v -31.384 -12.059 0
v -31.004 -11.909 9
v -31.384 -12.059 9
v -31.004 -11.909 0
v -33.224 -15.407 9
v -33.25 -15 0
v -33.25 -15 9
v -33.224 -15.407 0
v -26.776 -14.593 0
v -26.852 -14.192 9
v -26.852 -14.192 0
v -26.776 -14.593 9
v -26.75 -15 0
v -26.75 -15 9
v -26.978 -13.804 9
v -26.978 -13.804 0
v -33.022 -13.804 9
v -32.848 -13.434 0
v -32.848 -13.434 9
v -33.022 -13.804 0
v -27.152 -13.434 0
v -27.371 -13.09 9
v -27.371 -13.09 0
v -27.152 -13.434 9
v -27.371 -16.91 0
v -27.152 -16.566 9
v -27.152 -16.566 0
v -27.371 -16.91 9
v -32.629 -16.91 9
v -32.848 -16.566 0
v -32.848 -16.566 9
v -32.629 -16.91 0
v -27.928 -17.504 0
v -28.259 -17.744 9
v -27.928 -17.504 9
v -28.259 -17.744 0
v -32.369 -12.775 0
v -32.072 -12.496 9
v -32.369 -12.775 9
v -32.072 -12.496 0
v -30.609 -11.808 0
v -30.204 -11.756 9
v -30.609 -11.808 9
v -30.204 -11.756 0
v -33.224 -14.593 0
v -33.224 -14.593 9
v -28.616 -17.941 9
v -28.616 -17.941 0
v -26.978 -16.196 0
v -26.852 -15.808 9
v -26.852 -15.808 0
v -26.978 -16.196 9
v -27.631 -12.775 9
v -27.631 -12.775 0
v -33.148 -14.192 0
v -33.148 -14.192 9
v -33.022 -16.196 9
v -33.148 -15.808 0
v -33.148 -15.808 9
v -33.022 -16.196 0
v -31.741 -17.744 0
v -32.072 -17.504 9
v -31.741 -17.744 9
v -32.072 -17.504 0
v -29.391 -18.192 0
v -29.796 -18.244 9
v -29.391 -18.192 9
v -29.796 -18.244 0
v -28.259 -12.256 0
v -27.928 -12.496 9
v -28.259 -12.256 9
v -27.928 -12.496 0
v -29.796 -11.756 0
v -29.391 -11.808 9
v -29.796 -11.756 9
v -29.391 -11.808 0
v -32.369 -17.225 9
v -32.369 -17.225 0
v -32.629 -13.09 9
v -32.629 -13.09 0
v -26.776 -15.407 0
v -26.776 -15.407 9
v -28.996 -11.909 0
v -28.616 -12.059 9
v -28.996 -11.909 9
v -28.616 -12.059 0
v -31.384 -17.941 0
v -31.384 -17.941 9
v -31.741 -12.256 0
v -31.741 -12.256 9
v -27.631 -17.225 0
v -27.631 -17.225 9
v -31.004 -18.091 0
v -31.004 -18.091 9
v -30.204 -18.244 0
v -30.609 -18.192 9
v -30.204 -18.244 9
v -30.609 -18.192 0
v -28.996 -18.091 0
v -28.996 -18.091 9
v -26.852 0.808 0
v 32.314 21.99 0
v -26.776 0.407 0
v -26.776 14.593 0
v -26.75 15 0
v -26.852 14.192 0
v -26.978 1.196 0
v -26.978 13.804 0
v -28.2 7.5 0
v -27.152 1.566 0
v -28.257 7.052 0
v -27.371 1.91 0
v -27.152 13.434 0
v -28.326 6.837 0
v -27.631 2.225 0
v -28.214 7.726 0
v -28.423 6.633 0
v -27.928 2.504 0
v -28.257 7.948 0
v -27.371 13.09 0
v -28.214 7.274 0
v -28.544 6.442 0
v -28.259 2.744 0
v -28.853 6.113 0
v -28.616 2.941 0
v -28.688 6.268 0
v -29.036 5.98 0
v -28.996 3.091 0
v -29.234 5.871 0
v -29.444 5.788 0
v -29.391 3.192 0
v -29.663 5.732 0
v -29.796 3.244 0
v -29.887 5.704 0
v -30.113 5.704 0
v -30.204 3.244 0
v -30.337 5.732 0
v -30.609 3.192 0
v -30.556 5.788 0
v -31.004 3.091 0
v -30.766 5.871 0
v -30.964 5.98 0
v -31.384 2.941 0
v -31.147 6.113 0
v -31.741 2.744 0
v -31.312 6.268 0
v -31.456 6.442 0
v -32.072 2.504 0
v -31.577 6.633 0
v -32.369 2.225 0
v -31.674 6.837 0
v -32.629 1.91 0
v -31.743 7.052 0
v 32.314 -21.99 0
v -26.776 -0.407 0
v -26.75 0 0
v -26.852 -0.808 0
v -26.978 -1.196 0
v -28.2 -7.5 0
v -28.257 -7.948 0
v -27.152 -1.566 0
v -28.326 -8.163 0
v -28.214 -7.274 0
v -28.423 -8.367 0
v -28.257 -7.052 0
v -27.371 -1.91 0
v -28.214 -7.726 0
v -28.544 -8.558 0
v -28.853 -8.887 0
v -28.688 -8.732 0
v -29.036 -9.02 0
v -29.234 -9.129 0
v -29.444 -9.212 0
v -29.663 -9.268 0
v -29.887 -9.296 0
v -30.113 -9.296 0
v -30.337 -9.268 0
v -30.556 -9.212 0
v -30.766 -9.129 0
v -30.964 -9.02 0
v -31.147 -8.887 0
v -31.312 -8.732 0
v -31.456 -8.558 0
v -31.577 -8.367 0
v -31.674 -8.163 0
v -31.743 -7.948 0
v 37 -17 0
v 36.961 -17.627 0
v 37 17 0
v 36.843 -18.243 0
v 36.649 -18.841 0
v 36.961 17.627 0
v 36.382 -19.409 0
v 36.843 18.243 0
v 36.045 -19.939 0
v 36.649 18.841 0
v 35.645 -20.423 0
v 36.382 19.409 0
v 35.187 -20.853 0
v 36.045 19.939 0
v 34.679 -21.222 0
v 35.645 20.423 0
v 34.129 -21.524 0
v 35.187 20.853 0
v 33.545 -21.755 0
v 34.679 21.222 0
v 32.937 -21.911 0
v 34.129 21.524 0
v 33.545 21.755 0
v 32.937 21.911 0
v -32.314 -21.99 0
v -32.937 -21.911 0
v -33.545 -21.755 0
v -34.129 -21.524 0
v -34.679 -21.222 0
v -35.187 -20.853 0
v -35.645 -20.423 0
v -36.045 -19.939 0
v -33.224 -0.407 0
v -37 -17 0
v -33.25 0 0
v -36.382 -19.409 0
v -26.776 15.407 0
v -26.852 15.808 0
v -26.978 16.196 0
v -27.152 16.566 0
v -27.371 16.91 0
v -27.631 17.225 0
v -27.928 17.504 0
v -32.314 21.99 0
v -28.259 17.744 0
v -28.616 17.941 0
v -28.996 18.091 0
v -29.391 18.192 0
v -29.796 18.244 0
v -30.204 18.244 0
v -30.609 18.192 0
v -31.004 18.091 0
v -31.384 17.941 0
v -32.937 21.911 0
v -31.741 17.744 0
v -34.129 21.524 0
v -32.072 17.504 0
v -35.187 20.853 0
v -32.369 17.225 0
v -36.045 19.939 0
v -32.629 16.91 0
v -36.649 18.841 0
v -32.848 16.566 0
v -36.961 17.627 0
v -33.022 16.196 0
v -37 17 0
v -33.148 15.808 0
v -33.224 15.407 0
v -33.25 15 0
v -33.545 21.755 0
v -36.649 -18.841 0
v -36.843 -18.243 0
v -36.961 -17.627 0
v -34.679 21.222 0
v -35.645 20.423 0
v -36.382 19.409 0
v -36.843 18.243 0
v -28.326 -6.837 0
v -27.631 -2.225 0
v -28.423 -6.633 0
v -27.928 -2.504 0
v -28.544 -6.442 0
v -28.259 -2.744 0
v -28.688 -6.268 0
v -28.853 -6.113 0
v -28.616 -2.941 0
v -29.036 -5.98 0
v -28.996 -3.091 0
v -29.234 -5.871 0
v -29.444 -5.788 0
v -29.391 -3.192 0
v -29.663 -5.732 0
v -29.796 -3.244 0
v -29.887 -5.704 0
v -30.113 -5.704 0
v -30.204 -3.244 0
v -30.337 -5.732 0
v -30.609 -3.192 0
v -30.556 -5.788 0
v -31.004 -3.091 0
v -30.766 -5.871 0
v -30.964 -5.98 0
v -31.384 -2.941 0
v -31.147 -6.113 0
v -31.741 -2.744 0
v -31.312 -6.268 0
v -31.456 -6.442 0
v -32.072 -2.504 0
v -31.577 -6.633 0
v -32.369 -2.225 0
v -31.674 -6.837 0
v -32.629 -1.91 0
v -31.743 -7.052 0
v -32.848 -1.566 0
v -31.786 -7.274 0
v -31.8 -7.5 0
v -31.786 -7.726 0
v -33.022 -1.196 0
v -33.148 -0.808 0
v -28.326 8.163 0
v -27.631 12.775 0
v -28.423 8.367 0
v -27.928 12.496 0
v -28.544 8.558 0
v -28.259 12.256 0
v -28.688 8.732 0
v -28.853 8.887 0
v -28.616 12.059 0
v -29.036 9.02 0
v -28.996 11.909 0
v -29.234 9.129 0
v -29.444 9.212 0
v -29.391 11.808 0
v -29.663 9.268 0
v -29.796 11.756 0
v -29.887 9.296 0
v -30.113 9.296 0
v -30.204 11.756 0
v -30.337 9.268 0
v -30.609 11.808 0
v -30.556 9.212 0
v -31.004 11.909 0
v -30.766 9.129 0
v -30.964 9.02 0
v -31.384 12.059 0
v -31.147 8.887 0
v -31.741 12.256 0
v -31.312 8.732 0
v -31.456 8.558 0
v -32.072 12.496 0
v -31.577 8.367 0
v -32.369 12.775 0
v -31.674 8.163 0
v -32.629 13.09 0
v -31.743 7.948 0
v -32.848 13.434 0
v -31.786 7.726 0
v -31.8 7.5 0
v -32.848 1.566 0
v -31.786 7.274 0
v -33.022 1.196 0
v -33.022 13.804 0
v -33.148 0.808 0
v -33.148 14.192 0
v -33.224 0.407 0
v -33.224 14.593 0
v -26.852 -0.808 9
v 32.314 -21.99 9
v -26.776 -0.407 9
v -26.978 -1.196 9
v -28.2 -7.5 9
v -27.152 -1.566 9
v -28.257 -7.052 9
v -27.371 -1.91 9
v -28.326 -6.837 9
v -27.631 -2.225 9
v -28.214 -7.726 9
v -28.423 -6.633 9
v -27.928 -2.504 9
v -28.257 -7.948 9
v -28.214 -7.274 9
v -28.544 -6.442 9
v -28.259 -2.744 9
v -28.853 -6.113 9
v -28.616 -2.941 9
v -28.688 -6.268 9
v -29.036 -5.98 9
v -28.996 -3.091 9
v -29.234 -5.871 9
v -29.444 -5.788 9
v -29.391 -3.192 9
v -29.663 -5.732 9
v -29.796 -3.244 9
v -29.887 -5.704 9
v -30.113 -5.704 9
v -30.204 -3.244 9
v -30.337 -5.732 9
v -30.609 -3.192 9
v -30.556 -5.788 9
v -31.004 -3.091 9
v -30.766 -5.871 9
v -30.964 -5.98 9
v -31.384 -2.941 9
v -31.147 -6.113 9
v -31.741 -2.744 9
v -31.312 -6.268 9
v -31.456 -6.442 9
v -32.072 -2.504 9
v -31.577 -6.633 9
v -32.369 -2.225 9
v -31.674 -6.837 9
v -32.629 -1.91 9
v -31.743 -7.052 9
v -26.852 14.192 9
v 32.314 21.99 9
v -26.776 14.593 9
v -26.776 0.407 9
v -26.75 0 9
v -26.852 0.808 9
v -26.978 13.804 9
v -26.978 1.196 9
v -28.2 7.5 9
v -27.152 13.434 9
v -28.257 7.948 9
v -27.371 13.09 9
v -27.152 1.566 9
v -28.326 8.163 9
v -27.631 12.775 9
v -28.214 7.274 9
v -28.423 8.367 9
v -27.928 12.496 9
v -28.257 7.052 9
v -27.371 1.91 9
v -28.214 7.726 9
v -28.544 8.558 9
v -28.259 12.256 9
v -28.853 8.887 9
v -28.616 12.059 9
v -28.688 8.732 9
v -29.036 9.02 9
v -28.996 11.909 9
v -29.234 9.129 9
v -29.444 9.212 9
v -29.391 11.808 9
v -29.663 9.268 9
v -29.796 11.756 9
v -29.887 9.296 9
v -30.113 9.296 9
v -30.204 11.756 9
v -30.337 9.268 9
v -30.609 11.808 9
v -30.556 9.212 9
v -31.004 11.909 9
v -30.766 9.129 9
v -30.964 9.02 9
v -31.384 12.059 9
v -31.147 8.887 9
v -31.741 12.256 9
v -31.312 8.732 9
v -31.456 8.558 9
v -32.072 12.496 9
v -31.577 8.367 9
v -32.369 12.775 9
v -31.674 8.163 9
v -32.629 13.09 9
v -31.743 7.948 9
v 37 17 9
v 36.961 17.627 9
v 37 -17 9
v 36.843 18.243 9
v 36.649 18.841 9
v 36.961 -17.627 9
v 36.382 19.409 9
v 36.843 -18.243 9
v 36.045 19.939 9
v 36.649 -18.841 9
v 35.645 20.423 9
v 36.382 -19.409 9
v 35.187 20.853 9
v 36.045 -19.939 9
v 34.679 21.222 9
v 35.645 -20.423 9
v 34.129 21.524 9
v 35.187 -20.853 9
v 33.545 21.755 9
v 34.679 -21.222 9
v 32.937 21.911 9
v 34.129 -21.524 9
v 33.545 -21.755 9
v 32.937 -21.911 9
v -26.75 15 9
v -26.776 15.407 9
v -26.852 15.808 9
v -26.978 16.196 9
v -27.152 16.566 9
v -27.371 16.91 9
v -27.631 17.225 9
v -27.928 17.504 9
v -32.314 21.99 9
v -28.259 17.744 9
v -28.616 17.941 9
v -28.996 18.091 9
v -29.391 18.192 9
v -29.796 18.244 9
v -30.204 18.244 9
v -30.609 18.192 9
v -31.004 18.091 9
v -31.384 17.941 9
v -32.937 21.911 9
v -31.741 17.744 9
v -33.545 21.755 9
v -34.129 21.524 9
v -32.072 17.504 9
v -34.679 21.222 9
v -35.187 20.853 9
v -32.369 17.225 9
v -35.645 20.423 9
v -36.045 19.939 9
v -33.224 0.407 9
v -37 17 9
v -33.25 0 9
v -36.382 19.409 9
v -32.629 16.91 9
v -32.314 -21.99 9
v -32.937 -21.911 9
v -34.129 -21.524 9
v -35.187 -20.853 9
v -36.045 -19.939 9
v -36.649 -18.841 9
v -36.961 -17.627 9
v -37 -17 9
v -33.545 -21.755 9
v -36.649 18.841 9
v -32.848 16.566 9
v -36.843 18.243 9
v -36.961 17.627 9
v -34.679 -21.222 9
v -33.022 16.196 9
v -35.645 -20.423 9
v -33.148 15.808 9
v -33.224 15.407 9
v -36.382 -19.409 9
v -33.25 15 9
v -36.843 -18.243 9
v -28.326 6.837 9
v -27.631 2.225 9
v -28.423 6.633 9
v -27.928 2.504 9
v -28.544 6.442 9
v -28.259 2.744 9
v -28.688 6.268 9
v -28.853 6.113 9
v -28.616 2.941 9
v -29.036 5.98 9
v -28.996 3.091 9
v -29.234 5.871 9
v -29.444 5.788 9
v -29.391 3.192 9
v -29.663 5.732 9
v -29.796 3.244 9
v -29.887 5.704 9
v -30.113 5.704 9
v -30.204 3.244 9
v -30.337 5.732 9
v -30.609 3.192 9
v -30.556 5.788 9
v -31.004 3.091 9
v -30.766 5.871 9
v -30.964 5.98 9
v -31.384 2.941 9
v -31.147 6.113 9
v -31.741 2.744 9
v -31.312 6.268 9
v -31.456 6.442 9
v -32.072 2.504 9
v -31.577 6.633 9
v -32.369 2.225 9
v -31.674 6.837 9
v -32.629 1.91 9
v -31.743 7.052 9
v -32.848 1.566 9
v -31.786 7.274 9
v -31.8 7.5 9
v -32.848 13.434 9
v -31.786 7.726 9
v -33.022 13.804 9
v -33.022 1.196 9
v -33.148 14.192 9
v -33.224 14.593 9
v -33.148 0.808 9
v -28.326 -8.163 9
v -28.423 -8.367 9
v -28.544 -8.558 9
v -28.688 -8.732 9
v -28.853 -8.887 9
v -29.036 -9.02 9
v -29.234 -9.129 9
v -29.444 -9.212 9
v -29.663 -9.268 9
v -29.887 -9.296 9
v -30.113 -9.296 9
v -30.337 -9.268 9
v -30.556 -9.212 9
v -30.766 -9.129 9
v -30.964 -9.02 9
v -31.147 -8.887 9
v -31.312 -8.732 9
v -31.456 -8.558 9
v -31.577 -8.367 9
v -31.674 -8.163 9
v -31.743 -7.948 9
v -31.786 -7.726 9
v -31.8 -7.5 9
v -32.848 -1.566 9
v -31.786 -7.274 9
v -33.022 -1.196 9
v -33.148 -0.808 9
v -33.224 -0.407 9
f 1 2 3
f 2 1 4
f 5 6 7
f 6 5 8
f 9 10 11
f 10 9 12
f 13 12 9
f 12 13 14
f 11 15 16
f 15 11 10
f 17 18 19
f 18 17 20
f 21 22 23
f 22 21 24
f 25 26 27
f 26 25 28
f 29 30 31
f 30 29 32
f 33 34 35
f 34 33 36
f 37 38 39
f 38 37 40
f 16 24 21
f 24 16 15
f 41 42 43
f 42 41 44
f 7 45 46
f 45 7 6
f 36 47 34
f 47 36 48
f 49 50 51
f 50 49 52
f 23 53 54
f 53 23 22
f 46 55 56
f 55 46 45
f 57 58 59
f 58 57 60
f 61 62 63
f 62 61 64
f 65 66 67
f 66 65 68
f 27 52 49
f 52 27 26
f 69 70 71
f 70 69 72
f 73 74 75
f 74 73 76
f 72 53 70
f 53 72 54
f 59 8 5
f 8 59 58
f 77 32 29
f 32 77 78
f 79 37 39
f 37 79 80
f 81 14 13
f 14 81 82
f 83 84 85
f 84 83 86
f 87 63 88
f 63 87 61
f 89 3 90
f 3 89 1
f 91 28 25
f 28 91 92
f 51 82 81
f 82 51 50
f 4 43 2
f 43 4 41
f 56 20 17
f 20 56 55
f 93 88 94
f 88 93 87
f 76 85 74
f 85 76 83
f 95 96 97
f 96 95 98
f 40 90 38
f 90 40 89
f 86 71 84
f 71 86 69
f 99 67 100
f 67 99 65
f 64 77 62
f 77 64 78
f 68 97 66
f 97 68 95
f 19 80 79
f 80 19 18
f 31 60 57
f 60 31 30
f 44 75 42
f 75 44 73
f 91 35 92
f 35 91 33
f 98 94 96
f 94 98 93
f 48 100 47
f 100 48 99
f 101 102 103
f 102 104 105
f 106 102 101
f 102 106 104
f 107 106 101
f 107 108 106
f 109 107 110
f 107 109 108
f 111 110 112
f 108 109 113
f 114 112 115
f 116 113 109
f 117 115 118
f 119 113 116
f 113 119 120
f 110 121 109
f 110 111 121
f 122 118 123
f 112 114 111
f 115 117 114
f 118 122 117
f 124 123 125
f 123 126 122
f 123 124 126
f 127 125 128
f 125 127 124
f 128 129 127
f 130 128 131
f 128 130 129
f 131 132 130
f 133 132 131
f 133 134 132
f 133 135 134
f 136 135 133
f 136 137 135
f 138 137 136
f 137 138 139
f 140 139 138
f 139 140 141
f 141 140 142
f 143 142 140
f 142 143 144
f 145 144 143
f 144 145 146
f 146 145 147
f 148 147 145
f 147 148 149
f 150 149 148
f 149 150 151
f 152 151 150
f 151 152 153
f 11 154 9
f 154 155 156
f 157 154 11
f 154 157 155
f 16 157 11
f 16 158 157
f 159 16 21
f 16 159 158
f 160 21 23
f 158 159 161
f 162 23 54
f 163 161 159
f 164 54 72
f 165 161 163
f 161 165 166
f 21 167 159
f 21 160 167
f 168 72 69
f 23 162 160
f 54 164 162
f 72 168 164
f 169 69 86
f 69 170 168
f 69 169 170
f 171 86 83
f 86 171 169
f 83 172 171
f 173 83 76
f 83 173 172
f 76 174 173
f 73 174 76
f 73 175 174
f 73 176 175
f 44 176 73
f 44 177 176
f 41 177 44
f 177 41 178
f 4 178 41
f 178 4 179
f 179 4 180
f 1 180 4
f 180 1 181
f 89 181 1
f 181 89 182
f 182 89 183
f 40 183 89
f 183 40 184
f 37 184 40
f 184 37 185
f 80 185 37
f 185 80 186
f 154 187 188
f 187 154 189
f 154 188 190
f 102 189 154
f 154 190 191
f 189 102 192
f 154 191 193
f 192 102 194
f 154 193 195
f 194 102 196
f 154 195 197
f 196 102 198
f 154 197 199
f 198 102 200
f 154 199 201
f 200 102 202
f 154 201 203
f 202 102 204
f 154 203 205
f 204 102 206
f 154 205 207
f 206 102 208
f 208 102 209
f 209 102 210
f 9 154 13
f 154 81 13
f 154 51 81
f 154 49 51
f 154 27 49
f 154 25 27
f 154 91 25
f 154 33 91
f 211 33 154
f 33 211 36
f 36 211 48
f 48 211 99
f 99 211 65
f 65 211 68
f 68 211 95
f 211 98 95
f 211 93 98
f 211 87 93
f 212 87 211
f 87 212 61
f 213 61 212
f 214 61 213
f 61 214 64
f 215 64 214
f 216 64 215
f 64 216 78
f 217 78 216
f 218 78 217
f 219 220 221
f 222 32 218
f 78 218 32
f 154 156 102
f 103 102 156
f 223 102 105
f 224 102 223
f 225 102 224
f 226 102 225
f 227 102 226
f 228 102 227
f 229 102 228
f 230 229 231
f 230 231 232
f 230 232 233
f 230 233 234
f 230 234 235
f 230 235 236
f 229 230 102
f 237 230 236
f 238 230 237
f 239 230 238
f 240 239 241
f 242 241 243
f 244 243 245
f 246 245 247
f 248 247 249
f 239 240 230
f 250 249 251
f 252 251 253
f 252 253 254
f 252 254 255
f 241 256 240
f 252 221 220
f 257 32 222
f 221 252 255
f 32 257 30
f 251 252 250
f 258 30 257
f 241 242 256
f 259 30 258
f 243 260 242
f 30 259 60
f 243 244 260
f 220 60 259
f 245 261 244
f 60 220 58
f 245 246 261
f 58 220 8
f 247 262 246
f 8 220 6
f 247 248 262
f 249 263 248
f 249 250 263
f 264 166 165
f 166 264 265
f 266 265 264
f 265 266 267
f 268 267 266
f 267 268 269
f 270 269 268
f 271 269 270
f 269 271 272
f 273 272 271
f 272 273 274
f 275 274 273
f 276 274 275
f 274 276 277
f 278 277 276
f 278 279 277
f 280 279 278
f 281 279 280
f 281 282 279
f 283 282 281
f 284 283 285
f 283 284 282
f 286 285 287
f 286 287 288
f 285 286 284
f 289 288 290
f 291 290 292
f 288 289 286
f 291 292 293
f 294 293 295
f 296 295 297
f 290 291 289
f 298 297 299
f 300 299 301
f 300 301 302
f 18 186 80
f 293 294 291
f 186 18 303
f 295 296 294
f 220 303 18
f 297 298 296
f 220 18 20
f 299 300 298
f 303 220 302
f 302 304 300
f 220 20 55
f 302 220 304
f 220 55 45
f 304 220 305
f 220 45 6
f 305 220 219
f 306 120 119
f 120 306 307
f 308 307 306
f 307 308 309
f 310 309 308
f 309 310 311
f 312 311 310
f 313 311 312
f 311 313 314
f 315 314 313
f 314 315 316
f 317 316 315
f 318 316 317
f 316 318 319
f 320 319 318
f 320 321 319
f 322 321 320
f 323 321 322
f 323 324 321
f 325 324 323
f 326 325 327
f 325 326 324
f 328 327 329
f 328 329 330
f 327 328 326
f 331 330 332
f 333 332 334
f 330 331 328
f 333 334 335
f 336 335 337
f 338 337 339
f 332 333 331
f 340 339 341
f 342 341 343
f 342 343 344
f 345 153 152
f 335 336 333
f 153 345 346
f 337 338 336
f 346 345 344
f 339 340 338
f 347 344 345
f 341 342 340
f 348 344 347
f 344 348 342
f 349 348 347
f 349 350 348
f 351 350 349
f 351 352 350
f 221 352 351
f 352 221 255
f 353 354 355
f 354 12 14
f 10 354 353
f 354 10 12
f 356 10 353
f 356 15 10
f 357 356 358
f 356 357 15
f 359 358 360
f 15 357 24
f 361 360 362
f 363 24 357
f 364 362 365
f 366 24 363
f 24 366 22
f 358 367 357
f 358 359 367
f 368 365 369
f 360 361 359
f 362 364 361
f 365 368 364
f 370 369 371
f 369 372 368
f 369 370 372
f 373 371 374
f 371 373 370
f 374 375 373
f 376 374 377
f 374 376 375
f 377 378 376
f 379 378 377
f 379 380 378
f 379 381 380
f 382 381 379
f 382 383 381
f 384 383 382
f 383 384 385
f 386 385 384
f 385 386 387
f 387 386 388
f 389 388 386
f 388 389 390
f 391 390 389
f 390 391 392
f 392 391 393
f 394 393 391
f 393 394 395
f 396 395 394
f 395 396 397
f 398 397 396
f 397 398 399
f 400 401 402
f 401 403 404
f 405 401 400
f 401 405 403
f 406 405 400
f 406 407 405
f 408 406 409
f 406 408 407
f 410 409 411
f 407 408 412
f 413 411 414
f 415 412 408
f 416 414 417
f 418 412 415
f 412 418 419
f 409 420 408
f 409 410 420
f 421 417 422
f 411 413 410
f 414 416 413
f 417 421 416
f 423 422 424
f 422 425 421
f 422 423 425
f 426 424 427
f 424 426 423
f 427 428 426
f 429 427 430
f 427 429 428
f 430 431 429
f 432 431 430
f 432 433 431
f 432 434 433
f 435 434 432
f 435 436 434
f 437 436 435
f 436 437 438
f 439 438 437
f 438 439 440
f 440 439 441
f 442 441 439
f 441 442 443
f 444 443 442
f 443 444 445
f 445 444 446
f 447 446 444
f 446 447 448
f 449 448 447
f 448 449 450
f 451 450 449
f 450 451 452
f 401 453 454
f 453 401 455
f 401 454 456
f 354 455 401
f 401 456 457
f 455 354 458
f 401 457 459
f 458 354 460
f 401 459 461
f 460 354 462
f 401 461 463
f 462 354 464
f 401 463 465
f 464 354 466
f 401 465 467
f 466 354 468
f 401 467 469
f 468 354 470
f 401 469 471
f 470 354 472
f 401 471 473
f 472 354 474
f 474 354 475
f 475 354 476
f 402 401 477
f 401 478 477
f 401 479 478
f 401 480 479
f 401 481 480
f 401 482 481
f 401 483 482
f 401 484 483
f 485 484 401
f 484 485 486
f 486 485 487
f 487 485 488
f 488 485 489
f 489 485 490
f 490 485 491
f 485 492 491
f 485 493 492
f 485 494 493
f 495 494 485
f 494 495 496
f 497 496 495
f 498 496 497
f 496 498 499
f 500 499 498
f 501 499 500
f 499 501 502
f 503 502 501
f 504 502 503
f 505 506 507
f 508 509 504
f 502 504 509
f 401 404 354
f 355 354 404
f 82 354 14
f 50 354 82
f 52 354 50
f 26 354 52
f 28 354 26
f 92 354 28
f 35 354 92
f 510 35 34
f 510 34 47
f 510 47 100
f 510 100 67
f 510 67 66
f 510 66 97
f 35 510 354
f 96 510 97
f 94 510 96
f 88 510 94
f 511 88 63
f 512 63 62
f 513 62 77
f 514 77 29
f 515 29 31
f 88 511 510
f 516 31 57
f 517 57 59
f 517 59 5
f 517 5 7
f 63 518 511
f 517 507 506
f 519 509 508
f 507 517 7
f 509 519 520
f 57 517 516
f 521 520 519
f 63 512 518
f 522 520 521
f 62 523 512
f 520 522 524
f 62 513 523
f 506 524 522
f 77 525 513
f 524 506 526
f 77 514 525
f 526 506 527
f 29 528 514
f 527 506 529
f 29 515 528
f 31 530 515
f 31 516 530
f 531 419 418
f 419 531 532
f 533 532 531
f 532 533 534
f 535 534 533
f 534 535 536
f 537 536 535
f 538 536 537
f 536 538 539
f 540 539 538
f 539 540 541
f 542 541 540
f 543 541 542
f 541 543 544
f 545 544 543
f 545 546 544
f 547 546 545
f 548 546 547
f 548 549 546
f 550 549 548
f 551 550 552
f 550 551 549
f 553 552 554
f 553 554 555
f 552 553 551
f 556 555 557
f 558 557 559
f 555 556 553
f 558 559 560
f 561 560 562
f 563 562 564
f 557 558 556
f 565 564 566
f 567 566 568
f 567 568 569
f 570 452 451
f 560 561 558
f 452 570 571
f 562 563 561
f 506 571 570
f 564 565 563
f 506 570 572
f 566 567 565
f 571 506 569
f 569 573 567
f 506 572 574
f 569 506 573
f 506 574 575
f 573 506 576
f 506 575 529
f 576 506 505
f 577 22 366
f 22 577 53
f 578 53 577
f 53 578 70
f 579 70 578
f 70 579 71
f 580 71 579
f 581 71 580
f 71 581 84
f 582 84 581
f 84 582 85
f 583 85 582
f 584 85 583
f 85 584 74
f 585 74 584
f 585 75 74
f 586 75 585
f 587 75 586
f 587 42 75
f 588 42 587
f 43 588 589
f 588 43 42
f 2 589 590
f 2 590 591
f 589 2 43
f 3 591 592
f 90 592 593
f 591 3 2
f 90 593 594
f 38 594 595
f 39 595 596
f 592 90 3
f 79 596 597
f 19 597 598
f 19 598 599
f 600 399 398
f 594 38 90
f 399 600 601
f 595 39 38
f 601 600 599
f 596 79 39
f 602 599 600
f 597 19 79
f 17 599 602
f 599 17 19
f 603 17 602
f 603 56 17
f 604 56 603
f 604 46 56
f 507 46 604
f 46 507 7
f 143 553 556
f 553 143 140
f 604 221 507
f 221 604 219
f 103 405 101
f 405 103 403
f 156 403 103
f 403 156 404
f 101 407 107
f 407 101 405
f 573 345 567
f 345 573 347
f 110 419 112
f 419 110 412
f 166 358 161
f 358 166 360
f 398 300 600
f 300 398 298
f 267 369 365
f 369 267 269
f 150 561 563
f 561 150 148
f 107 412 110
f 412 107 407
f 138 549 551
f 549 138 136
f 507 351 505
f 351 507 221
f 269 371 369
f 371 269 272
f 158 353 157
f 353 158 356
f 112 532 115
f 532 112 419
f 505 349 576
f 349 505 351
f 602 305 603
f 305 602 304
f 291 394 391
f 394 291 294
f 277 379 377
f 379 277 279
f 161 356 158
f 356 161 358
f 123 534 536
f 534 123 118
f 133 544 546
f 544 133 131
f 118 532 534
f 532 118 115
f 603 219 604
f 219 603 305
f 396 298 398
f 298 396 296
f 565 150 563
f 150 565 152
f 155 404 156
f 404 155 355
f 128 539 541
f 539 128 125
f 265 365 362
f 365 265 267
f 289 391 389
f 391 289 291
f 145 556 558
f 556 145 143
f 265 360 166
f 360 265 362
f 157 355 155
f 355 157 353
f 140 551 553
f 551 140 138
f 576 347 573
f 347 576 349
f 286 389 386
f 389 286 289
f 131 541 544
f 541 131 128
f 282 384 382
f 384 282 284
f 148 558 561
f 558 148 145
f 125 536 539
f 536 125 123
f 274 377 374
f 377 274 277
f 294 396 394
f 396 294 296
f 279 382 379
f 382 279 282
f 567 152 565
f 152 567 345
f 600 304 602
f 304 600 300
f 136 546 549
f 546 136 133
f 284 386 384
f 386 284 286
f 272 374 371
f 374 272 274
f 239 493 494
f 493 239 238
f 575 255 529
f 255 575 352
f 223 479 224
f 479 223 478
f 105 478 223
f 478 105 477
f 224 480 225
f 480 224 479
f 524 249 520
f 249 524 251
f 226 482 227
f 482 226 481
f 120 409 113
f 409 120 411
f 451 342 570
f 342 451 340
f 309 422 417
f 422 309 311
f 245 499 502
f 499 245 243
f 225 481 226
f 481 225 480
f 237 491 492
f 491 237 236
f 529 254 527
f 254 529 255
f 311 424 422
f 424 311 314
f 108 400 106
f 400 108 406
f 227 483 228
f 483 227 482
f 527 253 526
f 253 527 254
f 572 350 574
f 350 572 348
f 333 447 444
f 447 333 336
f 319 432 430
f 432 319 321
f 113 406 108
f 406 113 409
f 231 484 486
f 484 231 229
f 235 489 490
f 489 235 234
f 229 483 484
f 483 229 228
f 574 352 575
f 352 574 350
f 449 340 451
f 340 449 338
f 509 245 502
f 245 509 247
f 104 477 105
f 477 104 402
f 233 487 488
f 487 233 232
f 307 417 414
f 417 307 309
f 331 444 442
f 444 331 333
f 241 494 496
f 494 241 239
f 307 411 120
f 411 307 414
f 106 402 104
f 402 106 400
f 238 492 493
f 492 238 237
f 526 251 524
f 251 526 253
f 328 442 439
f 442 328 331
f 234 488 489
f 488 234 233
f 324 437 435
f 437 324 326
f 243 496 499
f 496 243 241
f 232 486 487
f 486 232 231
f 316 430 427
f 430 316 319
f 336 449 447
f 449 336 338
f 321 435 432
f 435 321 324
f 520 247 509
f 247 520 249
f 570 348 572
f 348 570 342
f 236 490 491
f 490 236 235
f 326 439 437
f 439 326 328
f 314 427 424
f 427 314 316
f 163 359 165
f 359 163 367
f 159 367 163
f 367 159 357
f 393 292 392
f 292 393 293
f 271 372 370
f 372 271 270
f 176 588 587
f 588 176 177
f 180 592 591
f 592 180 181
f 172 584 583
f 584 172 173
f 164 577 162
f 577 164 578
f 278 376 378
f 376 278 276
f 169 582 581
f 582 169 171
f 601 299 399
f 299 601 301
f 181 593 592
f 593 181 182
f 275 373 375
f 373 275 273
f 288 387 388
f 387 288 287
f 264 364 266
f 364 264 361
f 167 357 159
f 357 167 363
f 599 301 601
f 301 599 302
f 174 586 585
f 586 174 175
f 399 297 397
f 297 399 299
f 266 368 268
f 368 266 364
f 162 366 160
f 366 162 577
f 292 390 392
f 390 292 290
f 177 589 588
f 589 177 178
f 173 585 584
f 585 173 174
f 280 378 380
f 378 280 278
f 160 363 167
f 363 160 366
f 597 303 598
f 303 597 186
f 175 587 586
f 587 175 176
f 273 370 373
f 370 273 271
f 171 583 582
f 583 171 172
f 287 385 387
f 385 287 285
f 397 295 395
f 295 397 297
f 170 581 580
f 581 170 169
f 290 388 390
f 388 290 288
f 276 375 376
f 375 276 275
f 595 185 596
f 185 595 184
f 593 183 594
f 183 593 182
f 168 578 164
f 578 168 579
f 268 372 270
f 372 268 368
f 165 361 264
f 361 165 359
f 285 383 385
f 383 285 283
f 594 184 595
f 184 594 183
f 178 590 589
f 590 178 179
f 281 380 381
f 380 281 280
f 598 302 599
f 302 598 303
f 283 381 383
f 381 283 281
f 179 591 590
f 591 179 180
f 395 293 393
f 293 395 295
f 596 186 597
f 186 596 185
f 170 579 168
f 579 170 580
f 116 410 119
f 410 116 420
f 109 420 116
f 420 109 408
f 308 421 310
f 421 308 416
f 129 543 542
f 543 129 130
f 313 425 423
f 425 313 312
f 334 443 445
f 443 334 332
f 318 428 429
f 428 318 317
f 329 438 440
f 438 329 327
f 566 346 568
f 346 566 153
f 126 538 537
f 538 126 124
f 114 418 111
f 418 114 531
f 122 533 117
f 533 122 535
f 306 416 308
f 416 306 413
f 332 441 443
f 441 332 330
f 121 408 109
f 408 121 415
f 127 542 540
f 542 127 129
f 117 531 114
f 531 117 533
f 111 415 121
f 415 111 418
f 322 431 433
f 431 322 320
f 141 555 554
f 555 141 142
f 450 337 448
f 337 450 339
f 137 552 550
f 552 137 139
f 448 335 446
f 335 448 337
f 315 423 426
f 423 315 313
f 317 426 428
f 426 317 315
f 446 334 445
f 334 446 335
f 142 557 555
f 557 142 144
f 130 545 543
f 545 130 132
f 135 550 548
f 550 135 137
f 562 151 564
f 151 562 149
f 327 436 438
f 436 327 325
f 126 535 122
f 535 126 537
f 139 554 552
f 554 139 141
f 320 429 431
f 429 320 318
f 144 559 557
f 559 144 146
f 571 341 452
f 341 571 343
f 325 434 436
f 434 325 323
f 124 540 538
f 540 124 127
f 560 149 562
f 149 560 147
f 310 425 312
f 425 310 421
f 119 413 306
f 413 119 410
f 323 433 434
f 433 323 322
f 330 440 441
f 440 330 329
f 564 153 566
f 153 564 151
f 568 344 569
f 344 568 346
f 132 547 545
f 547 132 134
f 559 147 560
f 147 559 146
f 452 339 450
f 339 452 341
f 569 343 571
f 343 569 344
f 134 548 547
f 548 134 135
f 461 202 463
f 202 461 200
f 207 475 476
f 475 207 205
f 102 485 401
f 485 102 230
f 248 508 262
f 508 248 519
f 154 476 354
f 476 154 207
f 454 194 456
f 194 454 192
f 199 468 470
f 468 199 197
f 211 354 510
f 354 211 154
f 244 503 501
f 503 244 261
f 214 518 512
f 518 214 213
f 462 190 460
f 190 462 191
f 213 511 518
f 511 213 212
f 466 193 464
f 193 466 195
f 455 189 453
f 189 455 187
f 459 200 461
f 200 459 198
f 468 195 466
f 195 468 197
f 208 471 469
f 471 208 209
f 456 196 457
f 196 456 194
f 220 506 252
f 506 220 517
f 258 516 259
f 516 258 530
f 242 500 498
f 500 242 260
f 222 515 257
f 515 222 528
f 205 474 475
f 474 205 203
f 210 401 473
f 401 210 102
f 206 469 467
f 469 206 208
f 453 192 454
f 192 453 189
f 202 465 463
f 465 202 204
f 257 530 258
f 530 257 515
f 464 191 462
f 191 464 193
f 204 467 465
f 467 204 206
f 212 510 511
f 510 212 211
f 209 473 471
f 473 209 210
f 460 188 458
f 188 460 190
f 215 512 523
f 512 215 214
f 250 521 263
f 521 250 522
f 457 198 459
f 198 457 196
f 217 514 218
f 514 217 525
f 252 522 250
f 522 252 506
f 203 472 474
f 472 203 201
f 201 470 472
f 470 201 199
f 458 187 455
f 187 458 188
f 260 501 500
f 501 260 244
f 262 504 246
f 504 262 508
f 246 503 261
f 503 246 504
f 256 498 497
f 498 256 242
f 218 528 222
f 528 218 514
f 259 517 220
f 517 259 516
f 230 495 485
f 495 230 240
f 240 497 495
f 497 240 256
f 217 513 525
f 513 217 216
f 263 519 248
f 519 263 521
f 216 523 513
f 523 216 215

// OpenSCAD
$fn = 50;


difference() {
	union() {
		hull() {
			translate(v = [-32.0000000000, 17.0000000000, 0]) {
				cylinder(h = 9, r = 5);
			}
			translate(v = [32.0000000000, 17.0000000000, 0]) {
				cylinder(h = 9, r = 5);
			}
			translate(v = [-32.0000000000, -17.0000000000, 0]) {
				cylinder(h = 9, r = 5);
			}
			translate(v = [32.0000000000, -17.0000000000, 0]) {
				cylinder(h = 9, r = 5);
			}
		}
	}
	union() {
		translate(v = [-30.0000000000, -15.0000000000, 0]) {
			cylinder(h = 9, r = 3.2500000000);
		}
		translate(v = [-30.0000000000, 0.0000000000, 0]) {
			cylinder(h = 9, r = 3.2500000000);
		}
		translate(v = [-30.0000000000, 15.0000000000, 0]) {
			cylinder(h = 9, r = 3.2500000000);
		}
		translate(v = [-30.0000000000, -15.0000000000, 0]) {
			cylinder(h = 9, r = 1.8000000000);
		}
		translate(v = [-30.0000000000, -7.5000000000, 0]) {
			cylinder(h = 9, r = 1.8000000000);
		}
		translate(v = [-30.0000000000, 0.0000000000, 0]) {
			cylinder(h = 9, r = 1.8000000000);
		}
		translate(v = [-30.0000000000, 7.5000000000, 0]) {
			cylinder(h = 9, r = 1.8000000000);
		}
		translate(v = [-30.0000000000, 15.0000000000, 0]) {
			cylinder(h = 9, r = 1.8000000000);
		}
		translate(v = [-30.0000000000, -15.0000000000, 0]) {
			cylinder(h = 9, r = 1.8000000000);
		}
		translate(v = [-30.0000000000, -7.5000000000, 0]) {
			cylinder(h = 9, r = 1.8000000000);
		}
		translate(v = [-30.0000000000, 0.0000000000, 0]) {
			cylinder(h = 9, r = 1.8000000000);
		}
		translate(v = [-30.0000000000, 7.5000000000, 0]) {
			cylinder(h = 9, r = 1.8000000000);
		}
		translate(v = [-30.0000000000, 15.0000000000, 0]) {
			cylinder(h = 9, r = 1.8000000000);
		}
		translate(v = [-30.0000000000, -15.0000000000, 0]) {
			cylinder(h = 9, r = 1.8000000000);
		}
		translate(v = [-30.0000000000, -7.5000000000, 0]) {
			cylinder(h = 9, r = 1.8000000000);
		}
		translate(v = [-30.0000000000, 0.0000000000, 0]) {
			cylinder(h = 9, r = 1.8000000000);
		}
		translate(v = [-30.0000000000, 7.5000000000, 0]) {
			cylinder(h = 9, r = 1.8000000000);
		}
		translate(v = [-30.0000000000, 15.0000000000, 0]) {
			cylinder(h = 9, r = 1.8000000000);
		}
	}
}
